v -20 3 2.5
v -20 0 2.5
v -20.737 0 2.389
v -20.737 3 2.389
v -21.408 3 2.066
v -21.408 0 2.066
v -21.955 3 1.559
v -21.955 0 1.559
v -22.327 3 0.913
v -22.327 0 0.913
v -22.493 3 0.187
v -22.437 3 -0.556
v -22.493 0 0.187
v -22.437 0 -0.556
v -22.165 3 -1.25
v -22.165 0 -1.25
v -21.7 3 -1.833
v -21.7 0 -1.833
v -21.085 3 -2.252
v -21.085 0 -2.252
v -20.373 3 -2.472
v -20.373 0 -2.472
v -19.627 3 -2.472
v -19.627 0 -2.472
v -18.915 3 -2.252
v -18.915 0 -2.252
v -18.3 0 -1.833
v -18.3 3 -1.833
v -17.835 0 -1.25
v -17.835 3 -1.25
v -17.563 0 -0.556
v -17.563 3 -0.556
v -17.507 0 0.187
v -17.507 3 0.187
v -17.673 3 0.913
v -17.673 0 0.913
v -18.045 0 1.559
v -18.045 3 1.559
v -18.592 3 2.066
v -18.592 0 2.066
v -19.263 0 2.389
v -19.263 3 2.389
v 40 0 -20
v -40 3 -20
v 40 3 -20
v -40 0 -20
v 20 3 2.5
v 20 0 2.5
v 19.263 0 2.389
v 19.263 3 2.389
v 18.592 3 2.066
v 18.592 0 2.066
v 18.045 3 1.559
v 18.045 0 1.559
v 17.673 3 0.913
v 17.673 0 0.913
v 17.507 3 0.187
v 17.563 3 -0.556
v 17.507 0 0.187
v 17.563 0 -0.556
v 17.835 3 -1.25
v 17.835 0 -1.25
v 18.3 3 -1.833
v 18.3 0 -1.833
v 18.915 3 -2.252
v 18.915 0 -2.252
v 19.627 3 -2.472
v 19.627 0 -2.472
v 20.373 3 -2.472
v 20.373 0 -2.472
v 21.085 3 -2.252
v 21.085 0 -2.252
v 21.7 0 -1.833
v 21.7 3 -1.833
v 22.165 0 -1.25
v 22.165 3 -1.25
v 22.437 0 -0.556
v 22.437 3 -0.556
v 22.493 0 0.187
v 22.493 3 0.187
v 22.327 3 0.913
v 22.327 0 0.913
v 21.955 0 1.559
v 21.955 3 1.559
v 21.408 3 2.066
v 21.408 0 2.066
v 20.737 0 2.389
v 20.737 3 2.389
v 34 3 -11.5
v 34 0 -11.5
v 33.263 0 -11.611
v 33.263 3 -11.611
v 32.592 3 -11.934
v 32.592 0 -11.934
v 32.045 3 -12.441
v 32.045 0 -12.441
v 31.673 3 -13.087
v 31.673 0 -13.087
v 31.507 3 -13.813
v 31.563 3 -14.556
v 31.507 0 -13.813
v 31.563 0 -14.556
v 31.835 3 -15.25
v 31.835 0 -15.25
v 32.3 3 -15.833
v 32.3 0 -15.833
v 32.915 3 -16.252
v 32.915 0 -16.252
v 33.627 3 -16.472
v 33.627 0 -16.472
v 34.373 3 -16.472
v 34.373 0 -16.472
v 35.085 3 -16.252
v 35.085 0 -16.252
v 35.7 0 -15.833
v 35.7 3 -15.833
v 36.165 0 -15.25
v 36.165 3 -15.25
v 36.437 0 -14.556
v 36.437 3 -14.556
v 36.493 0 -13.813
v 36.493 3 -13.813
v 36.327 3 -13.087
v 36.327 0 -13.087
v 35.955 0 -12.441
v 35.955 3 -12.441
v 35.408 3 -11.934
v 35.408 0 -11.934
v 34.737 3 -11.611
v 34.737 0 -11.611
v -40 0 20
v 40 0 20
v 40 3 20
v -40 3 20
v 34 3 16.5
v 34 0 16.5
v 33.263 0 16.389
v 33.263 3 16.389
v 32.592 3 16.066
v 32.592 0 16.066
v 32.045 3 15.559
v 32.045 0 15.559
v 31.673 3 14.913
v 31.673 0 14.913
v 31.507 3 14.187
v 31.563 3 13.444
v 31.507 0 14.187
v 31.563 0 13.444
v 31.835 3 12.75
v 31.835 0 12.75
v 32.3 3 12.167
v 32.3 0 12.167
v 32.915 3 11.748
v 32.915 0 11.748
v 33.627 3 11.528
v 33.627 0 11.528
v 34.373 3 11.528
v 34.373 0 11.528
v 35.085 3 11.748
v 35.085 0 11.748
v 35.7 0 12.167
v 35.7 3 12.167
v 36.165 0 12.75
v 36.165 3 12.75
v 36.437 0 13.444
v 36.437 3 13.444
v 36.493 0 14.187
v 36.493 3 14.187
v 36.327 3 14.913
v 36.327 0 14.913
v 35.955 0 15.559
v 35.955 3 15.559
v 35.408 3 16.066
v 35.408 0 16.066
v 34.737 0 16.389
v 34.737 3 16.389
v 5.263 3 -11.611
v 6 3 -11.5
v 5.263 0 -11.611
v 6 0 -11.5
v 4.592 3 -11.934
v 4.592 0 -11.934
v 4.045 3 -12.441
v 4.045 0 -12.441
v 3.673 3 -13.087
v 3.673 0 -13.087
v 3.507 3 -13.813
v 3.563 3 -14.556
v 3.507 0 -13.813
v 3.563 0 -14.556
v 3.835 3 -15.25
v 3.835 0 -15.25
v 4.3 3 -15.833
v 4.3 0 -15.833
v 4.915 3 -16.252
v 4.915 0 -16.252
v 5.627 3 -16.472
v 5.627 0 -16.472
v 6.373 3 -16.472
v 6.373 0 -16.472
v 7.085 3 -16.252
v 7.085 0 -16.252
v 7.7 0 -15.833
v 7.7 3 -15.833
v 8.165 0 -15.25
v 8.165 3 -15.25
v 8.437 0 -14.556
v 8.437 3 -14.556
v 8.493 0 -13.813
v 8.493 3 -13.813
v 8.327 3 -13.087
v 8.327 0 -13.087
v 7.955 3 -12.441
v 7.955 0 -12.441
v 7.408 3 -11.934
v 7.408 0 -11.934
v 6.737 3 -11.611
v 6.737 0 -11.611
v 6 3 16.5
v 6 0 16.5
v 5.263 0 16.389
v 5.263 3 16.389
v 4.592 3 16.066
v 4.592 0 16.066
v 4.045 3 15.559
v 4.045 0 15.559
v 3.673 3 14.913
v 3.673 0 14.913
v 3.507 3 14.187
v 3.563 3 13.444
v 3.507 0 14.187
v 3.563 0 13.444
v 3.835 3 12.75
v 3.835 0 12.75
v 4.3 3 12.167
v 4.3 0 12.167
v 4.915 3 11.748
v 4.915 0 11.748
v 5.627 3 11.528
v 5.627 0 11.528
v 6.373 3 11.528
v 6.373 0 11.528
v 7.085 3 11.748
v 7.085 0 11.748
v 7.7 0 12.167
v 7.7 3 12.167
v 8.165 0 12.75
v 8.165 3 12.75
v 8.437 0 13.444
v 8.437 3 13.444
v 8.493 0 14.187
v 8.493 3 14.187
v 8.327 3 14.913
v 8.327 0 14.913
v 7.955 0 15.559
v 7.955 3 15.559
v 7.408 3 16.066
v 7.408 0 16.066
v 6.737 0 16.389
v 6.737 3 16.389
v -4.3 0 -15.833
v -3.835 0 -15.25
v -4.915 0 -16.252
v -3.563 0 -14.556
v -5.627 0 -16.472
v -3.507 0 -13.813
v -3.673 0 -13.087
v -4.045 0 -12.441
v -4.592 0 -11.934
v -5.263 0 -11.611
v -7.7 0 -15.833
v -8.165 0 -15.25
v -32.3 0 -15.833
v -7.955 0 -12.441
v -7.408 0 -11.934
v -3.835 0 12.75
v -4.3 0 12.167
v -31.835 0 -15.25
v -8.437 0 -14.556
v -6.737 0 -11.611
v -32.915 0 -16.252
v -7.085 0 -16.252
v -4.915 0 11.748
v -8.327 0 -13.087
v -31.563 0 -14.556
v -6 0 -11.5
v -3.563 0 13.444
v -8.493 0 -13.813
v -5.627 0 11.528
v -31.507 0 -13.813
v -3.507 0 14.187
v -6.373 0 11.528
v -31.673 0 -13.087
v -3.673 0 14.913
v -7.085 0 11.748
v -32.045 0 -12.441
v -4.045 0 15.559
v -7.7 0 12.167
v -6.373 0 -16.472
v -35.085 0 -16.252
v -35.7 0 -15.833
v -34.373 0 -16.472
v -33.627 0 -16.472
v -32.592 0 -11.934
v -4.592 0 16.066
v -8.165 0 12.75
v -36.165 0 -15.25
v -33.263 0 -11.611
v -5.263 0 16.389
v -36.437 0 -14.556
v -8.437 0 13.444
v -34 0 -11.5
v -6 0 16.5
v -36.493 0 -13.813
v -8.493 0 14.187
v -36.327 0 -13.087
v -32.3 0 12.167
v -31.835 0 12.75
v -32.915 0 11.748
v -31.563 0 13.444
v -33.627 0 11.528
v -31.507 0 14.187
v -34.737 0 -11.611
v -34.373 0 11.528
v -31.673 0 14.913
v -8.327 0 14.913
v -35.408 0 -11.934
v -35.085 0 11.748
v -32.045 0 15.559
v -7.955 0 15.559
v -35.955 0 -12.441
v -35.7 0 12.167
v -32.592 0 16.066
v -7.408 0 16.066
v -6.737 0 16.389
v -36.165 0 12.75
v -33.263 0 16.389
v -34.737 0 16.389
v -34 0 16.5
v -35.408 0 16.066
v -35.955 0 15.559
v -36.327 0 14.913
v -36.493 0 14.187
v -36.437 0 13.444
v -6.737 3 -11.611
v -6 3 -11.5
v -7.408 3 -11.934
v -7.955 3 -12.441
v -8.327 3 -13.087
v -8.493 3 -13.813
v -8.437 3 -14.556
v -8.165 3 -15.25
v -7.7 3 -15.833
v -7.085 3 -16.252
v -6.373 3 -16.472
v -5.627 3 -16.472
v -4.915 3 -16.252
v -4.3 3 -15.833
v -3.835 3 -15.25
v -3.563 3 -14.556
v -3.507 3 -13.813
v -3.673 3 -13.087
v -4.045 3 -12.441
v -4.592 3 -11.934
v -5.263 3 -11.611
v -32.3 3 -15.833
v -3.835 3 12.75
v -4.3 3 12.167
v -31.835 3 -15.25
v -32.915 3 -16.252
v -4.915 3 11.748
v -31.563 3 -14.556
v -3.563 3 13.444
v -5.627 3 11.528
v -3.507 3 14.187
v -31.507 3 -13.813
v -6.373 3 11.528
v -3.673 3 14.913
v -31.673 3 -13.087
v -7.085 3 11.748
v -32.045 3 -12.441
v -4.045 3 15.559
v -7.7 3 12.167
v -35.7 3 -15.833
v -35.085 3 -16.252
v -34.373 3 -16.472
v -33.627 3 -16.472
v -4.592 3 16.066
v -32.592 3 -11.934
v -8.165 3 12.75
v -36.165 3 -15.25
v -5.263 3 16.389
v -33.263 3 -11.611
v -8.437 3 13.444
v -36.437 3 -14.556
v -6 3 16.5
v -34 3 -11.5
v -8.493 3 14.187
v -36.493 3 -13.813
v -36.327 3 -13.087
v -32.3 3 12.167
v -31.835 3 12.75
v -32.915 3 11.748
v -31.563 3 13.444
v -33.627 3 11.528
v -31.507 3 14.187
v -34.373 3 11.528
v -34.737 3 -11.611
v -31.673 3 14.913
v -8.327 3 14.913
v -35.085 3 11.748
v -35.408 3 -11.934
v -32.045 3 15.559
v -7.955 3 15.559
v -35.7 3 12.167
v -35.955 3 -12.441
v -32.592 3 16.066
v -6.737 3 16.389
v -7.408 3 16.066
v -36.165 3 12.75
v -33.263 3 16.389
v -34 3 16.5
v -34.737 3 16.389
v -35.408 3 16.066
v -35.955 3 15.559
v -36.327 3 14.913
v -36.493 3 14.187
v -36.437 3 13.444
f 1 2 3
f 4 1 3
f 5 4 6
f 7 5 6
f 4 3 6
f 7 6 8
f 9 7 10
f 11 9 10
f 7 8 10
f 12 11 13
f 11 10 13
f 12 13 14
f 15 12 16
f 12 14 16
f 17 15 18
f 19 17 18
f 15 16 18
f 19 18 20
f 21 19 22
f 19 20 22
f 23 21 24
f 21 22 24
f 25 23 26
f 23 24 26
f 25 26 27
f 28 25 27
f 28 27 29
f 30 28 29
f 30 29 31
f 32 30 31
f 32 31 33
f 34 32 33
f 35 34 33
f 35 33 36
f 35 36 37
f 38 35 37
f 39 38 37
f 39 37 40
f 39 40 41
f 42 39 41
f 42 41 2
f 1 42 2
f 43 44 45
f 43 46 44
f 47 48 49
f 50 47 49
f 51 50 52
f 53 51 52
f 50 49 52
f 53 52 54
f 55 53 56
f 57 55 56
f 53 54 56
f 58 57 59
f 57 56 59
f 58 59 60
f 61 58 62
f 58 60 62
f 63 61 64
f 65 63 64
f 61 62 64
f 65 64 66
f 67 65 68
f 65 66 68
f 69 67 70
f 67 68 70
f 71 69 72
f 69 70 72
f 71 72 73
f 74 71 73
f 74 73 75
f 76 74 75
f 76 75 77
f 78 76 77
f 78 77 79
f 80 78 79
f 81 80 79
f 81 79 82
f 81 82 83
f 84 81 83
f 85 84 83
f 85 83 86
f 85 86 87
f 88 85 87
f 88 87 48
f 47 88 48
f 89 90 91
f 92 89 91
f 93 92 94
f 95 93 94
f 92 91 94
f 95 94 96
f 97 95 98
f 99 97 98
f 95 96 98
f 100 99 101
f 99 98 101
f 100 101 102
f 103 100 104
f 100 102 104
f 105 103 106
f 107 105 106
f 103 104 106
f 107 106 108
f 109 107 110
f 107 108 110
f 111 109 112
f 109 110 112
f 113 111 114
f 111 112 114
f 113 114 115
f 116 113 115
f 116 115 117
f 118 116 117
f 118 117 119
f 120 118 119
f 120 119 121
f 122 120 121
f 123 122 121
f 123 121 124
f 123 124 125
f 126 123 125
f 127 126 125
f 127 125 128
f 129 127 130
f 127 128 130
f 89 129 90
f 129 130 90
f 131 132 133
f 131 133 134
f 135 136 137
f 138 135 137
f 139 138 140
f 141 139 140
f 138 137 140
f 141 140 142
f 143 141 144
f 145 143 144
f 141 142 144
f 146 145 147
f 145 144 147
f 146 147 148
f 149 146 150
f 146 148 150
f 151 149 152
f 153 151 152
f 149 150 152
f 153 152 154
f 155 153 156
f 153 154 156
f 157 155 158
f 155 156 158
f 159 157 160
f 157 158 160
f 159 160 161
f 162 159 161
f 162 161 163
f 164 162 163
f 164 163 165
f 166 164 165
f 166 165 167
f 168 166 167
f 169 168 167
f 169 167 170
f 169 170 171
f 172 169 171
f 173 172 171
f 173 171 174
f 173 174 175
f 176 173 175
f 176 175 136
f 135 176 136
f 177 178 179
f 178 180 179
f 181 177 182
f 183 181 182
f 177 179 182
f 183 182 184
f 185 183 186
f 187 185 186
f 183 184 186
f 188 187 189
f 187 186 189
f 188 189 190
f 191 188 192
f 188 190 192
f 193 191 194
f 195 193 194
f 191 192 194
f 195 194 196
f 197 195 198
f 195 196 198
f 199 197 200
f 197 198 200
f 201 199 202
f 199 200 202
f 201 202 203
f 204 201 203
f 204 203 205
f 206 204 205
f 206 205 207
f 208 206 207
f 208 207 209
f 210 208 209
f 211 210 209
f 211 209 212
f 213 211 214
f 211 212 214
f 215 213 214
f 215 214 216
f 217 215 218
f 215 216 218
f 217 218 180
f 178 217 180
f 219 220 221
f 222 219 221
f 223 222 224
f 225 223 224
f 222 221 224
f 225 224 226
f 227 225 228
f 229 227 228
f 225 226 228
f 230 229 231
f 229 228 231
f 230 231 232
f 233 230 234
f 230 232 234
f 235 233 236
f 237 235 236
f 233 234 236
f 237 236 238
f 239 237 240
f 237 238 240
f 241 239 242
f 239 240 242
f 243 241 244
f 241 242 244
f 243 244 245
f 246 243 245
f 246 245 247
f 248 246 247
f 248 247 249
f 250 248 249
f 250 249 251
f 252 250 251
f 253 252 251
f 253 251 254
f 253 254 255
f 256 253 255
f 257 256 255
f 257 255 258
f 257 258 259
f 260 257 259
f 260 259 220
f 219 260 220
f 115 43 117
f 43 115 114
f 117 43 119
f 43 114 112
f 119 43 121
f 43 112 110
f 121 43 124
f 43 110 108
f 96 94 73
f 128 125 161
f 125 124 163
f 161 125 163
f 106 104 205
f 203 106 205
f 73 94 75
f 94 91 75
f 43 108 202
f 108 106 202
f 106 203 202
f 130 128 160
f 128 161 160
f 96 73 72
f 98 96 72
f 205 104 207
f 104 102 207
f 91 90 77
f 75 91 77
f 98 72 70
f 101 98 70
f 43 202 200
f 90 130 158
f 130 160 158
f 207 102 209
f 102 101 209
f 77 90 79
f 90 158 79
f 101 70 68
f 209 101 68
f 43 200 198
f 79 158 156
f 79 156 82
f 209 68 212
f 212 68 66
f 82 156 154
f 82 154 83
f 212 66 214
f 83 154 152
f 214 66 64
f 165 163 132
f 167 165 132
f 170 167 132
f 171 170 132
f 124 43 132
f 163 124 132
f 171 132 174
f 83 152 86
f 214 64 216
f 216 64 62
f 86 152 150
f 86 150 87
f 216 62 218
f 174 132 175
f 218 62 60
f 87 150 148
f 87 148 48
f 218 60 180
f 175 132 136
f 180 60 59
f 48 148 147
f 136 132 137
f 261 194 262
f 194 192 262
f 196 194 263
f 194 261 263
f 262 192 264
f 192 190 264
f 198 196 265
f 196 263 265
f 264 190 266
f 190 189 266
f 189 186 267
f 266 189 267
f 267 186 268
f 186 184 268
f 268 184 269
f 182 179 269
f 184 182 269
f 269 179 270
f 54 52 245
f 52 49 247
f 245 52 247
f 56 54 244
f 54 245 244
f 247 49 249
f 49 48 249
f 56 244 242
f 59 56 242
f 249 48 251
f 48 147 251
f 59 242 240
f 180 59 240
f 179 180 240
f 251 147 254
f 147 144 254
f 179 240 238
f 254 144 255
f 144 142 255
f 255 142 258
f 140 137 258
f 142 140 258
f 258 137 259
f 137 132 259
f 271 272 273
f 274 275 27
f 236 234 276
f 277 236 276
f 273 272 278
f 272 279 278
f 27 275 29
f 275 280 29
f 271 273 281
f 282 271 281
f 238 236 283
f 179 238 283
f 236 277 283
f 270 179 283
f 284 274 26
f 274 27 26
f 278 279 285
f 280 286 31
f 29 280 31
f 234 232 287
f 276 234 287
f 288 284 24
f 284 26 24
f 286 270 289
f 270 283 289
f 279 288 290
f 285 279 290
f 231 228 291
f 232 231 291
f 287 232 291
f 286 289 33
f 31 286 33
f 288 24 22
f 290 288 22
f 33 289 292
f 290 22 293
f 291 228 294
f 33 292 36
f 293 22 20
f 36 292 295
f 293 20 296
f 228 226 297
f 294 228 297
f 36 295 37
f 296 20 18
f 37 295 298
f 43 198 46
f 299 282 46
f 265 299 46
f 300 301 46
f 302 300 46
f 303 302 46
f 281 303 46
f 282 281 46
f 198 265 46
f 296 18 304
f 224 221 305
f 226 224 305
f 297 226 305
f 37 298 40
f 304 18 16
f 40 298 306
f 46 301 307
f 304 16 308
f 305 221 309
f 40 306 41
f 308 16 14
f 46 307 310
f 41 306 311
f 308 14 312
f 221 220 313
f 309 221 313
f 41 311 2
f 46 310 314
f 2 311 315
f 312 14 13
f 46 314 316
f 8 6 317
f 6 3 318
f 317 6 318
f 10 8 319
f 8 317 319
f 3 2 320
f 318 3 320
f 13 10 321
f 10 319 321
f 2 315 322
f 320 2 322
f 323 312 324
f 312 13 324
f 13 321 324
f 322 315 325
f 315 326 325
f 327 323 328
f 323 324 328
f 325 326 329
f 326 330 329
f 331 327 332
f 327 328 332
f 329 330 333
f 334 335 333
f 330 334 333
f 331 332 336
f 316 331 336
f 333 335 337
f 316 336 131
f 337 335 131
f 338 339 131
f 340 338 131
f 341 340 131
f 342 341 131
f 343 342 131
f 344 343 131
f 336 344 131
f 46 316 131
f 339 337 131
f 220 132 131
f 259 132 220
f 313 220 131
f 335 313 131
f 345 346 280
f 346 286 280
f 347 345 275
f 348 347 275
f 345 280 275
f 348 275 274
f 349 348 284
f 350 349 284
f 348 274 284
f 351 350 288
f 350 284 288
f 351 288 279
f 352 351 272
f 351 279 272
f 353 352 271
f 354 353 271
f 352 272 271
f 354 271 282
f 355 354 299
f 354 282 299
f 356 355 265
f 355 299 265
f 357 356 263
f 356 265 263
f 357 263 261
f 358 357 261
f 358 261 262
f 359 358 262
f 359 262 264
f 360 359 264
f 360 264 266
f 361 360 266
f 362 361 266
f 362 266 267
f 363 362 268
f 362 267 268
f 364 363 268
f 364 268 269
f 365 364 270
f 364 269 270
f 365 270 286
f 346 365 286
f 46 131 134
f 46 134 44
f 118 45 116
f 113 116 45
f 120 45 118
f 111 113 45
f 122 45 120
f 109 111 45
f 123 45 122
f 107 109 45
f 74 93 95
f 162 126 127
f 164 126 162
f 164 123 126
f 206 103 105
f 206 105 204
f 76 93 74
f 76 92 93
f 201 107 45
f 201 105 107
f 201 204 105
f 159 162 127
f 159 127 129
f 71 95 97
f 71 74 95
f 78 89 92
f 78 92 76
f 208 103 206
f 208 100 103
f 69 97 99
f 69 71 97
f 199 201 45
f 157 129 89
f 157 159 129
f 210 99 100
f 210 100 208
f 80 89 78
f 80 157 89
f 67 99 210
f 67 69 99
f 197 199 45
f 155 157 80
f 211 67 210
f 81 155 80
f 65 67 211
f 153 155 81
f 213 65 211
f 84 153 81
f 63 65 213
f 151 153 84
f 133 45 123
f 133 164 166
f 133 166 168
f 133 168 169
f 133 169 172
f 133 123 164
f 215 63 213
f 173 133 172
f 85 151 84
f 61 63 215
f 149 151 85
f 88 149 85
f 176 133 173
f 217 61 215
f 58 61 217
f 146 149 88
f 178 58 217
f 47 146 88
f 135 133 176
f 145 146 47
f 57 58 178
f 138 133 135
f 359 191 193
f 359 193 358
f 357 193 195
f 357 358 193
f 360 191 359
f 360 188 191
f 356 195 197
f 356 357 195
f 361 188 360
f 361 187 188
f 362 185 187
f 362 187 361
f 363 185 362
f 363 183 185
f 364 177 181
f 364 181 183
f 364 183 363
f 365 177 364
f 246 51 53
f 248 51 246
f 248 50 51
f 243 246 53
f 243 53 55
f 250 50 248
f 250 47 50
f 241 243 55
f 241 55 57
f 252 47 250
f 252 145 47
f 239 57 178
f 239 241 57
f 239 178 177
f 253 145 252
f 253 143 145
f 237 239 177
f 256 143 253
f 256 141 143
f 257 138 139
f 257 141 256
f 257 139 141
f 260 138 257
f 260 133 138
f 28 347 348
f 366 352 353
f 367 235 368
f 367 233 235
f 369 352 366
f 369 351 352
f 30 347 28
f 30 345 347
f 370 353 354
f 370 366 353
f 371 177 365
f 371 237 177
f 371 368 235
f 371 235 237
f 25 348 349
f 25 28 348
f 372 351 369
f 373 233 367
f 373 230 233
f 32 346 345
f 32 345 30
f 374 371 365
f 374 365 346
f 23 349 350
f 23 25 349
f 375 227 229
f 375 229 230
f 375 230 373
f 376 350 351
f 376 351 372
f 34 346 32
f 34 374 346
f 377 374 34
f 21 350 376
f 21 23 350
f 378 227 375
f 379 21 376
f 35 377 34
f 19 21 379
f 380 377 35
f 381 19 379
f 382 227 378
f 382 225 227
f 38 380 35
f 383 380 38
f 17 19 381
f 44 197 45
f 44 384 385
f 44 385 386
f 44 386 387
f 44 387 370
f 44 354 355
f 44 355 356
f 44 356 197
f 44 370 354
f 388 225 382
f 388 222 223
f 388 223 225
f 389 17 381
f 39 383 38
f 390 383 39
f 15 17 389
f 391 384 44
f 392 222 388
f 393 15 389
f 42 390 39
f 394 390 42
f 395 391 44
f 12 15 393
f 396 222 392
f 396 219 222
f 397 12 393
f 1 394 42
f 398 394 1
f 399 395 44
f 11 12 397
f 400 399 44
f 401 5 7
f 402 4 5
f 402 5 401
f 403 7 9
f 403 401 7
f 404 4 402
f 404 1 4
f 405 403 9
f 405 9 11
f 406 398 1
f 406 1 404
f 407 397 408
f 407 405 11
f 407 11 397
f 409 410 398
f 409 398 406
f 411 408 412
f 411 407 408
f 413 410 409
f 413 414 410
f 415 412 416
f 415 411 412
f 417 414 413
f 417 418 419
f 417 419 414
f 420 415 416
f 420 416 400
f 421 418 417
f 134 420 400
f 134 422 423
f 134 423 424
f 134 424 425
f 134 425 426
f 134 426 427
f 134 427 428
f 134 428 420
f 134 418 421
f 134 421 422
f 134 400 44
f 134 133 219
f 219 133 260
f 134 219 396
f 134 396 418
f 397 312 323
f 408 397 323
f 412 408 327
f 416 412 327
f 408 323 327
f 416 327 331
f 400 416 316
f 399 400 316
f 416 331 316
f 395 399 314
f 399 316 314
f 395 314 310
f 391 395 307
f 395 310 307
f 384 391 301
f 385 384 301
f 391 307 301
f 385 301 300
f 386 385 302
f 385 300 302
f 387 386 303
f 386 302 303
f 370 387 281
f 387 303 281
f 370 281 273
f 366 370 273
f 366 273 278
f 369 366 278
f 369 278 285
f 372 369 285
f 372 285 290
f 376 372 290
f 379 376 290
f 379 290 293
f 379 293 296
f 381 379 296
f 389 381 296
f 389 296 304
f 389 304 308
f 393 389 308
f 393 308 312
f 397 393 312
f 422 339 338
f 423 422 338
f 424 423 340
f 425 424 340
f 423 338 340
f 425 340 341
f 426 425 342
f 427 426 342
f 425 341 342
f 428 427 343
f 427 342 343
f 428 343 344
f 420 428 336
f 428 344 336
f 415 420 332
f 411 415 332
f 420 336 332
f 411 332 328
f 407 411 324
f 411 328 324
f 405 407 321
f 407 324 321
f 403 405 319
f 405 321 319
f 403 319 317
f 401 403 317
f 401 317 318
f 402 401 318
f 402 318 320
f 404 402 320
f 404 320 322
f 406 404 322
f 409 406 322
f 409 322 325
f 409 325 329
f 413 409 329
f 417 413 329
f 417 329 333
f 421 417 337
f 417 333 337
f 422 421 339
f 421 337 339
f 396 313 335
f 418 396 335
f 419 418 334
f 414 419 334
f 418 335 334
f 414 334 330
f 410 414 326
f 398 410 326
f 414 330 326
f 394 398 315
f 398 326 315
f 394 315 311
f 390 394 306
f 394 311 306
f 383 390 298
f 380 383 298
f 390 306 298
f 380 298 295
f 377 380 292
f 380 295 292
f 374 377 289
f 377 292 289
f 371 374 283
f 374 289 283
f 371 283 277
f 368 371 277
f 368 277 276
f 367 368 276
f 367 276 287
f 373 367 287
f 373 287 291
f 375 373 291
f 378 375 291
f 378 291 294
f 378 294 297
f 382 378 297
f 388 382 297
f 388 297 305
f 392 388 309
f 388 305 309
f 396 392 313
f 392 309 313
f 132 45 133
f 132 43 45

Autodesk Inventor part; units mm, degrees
ref_plane "YZ Plane" through (0, 0, 0) normal (1, 0, 0) x (0, 1, 0)
ref_plane "XZ Plane" through (0, 0, 0) normal (0, 1, 0) x (-1, 0, 0)
ref_plane "XY Plane" through (0, 0, 0) normal (0, 0, 1) x (1, 0, 0)
sketch "Szkic1" plane through (0, 0, 0) normal (0, 1, 0) x (-1, 0, 0)
  line L0 (40, -20) -> (-40, -20)
  line L1 (-40, -20) -> (-40, 20)
  line L2 (-40, 20) -> (40, 20)
  line L3 (40, 20) -> (40, -20)
  line L4 (40, -20) -> (-40, 20) construction
  line L5 (-40, -20) -> (40, 20) construction
  point P0 (0, 0)
  dimension "d0" = 80
  dimension "d1" = 40
extrude "Wyciągnięcie proste1" add sketch "Szkic1" along normal blind 3
sketch "Szkic2" plane through (0, 3, 0) normal (0, 1, 0) x (1, 0, 0)
  line L0 (40, 20) -> (-40, 20) projected
  line L1 (34, 14) -> (34, -14)
  line L2 (-34, -14) -> (-34, 14)
  line L3 (-34, 14) -> (-6, 14)
  line L4 (-6, 14) -> (-6, -14)
  line L5 (-6, -14) -> (-34, -14)
  line L6 (-34, -14) -> (-34, 14)
  line L7 (34, 14) -> (6, 14)
  line L8 (6, 14) -> (6, -14)
  line L9 (6, -14) -> (34, -14)
  line L10 (34, -14) -> (34, 14)
  line L11 (6, 14) -> (34, -14) construction
  line L12 (34, 14) -> (6, -14) construction
  line L13 (-6, 14) -> (-34, -14) construction
  line L14 (-34, 14) -> (-6, -14) construction
  point P0 (0, 0)
  point P1 (-20, 0)
  point P2 (20, 0)
  dimension "d16" = 6
  dimension "d17" = 12
hole "Otwór1" at (34, 3, -14) at (34, 3, 14) at (-34, 3, 14) at (-34, 3, -14) at (6, 3, 14) at (-6, 3, 14) at (6, 3, -14) at (-6, 3, -14) at (20, 3, 0) at (-20, 3, 0) direction (0, -1, 0) diameter 5 end through all
equation "\"d17\" = 2 * d16"
properties part number "płaskownik"
